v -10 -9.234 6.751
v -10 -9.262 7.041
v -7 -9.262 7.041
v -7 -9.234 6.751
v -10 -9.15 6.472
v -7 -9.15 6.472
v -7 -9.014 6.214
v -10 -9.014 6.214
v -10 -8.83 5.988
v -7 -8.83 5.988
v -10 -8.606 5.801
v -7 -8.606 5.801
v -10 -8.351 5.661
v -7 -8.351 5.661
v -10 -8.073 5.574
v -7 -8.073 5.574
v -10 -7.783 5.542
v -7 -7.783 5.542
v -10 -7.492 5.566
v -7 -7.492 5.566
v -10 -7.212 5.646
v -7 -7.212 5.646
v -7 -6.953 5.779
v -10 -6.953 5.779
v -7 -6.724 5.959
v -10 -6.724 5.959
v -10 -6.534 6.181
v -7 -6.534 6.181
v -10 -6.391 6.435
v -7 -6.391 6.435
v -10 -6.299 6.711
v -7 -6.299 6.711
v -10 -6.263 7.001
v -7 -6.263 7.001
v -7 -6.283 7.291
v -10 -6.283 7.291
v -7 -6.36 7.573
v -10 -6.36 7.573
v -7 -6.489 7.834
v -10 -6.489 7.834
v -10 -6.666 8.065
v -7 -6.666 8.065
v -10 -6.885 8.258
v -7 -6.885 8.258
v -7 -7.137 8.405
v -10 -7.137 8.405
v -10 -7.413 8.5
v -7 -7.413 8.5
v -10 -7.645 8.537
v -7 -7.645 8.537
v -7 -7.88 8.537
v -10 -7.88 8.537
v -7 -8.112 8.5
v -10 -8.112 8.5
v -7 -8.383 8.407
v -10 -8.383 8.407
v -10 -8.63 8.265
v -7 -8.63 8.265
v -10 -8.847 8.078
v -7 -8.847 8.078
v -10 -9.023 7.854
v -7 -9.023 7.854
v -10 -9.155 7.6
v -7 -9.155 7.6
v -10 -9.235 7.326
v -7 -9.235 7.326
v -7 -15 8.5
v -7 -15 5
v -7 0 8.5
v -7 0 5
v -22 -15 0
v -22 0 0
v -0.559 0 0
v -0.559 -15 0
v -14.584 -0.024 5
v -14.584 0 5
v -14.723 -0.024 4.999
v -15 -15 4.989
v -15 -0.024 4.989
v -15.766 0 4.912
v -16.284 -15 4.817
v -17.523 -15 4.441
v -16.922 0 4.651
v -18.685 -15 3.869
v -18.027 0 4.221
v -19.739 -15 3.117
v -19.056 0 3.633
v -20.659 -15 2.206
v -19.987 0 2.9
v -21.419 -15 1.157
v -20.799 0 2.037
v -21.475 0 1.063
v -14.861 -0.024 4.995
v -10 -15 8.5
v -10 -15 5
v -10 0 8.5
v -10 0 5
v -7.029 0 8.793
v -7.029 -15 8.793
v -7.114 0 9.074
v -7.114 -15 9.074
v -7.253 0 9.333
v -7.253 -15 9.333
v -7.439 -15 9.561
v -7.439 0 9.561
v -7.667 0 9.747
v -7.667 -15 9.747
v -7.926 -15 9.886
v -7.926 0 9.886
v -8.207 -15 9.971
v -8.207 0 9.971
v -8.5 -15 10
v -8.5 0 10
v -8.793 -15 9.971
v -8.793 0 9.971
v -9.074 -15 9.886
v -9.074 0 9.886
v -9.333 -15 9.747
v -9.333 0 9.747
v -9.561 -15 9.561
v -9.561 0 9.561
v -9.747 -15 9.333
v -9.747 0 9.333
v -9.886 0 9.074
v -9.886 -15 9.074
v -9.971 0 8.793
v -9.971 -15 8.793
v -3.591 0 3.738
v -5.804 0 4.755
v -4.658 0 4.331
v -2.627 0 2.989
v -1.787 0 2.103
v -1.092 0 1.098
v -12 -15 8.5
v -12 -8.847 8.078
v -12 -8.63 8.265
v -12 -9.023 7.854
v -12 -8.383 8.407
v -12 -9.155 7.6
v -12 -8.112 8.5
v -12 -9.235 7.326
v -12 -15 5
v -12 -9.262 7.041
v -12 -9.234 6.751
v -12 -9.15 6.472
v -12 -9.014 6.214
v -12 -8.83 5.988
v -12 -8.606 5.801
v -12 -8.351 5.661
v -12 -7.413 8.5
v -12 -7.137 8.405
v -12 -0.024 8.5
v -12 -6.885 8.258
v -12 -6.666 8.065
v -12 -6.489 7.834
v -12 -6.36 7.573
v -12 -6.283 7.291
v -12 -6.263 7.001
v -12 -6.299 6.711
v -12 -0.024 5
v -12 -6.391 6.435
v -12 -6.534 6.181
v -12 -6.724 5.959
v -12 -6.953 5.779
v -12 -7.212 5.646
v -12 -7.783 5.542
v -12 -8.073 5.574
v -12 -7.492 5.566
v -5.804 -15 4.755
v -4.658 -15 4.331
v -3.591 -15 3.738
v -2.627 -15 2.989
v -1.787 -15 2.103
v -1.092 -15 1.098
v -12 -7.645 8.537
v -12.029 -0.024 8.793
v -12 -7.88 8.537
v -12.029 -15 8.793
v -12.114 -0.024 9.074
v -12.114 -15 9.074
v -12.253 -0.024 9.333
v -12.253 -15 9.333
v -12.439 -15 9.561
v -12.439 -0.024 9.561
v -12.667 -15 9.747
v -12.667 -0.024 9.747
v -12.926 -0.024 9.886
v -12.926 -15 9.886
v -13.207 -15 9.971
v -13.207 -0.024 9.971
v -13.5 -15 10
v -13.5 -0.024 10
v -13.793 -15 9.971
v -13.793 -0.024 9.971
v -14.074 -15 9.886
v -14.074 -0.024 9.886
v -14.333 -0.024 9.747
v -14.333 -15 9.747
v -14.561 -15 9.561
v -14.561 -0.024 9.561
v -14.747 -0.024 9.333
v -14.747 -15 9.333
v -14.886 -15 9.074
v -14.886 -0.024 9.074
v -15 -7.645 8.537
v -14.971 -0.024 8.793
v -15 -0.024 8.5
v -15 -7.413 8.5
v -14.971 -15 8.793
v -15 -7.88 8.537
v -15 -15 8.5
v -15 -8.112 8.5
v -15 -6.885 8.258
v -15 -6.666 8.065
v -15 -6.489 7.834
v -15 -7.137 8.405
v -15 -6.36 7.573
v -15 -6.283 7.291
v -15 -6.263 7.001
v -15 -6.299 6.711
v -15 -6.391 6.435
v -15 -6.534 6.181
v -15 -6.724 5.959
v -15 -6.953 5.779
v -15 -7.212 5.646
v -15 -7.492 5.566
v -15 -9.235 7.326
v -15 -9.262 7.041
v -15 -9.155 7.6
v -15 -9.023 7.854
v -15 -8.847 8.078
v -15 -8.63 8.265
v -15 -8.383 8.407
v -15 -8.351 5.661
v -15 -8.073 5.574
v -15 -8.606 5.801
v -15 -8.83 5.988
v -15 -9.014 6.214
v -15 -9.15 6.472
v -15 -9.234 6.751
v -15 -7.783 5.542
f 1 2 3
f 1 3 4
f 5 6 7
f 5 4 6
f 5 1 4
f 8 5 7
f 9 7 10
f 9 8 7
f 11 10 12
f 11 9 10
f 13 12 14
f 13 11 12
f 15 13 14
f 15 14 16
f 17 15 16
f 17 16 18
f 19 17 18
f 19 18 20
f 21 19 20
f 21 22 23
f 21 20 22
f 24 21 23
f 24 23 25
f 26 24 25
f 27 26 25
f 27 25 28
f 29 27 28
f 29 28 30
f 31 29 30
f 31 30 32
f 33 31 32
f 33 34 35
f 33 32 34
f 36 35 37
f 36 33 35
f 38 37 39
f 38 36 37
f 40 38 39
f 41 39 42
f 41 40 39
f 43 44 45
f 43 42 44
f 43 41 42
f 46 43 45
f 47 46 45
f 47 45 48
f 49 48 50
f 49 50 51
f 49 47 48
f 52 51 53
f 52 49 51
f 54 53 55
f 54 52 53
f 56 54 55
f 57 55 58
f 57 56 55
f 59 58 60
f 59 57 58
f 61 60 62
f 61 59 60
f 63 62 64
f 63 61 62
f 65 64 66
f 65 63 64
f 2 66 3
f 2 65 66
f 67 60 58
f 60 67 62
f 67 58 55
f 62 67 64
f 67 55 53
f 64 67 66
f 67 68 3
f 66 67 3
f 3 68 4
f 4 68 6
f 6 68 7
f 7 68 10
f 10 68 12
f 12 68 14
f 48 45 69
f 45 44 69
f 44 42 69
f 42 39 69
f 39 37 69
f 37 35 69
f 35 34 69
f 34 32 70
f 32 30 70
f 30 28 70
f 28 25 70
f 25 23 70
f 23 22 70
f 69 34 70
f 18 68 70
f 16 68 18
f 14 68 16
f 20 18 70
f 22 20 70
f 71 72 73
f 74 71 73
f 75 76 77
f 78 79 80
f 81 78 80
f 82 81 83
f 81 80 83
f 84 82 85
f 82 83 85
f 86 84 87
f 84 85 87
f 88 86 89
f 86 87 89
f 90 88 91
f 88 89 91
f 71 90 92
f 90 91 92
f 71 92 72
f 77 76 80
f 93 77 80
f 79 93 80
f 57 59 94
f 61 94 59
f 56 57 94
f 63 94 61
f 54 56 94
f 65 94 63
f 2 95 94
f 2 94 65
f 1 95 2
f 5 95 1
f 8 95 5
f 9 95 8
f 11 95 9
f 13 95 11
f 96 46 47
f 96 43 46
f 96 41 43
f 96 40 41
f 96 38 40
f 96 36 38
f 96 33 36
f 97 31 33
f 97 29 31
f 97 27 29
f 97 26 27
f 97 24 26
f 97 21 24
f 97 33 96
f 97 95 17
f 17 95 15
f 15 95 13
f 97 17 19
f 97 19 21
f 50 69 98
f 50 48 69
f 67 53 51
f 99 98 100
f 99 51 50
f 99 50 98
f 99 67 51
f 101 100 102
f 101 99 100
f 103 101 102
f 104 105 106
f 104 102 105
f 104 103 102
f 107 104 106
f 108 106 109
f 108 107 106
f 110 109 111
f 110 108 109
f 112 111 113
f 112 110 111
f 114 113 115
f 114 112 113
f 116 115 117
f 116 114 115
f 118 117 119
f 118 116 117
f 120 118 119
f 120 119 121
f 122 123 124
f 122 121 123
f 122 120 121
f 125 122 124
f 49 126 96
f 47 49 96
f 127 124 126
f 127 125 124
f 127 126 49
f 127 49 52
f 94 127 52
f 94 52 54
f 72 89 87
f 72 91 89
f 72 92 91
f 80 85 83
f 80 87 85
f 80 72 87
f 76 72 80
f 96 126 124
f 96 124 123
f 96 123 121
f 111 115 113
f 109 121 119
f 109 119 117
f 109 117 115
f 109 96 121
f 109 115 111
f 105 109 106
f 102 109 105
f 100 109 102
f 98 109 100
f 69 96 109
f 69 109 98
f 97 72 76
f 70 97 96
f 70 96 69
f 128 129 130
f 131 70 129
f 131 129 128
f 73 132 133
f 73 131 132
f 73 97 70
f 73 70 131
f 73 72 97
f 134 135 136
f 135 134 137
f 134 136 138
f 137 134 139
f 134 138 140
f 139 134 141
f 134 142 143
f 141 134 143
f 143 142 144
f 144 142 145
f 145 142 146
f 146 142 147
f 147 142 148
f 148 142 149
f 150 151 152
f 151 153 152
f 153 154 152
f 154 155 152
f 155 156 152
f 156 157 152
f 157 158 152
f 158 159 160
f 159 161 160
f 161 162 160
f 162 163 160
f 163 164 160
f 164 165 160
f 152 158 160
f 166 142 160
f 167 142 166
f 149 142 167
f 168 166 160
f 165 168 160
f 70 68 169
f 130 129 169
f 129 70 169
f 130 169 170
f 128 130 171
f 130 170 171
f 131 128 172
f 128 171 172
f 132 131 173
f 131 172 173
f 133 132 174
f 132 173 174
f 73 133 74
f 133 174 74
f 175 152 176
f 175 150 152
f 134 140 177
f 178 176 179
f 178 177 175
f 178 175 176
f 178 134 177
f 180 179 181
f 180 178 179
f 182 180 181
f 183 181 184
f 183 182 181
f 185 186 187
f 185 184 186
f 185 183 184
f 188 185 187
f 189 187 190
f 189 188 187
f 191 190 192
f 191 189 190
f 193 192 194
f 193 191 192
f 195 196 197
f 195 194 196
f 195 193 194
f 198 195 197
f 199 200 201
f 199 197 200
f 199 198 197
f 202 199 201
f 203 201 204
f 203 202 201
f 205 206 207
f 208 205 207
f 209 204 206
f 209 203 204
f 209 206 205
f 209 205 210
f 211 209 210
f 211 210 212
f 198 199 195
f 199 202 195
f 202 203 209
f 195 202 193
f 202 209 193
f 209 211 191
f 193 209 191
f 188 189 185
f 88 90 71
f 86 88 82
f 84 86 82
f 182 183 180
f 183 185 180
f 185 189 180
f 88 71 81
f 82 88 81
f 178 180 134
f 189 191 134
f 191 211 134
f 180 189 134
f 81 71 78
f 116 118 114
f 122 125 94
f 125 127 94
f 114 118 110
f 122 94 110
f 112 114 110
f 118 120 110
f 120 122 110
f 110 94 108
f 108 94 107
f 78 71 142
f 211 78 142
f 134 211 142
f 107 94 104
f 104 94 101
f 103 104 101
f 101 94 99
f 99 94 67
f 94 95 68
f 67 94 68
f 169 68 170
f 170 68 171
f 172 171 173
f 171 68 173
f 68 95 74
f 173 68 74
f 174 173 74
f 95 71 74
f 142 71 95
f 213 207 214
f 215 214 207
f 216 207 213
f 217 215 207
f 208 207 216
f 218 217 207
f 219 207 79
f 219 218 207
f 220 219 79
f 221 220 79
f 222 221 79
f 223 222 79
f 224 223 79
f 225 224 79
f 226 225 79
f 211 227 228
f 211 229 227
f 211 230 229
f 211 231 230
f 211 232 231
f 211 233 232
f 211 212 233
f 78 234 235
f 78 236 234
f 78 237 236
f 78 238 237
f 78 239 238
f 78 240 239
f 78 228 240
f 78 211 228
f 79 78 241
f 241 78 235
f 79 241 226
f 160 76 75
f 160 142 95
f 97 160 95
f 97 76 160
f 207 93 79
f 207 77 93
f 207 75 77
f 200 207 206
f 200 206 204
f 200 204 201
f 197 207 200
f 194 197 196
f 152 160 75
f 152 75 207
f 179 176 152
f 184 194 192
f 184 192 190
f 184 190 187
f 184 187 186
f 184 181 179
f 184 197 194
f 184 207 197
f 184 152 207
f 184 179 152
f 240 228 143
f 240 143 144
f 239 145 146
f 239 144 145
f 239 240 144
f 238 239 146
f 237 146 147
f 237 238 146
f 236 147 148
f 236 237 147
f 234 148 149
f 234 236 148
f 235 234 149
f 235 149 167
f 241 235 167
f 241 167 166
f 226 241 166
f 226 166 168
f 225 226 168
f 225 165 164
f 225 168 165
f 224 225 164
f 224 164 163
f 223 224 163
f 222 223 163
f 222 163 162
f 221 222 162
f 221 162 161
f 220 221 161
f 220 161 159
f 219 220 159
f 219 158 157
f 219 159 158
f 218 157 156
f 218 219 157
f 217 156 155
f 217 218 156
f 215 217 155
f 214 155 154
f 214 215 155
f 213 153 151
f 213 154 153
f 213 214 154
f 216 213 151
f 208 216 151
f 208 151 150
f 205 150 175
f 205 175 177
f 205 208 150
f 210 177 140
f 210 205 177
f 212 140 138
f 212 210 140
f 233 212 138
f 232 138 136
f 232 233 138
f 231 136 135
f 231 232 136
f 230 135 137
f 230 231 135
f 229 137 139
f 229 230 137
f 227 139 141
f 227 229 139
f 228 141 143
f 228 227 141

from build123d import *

# Parameters (mm, degrees)
SKETCH1_W               = 22
SKETCH1_H               = 15
BOSS_EXTRUDE1_DEPTH     = 5
SKETCH2_W               = 3
SKETCH2_H               = 15
SKETCH2_H_2             = 14.97636143
BOSS_EXTRUDE2_DEPTH     = 5
CUT_EXTRUDE2_DEPTH      = 22.656407828
CUT_EXTRUDE2_DEPTH_BACK = 22.656407828
SKETCH4_R               = 1.5
FILLET1_R               = 8
FILLET3_RADIUS          = 1.5
FILLET3_LENGTH          = 14.97636143
FILLET4_RADIUS          = 1.5
FILLET4_LENGTH          = 15


with BuildPart() as part:
    # Sketch1 → Boss-Extrude1 (new body)
    with BuildSketch(Plane.XY):
        with Locations((-11, -7.5)):
            Rectangle(SKETCH1_W, SKETCH1_H)
    extrude(amount=BOSS_EXTRUDE1_DEPTH)

    # Sketch2 → Boss-Extrude2 (add)
    with BuildSketch(Plane.XY.offset(5)):
        with Locations((-8.5, -7.5)):
            Rectangle(SKETCH2_W, SKETCH2_H)
        with Locations((-13.5, -7.511819285)):
            Rectangle(SKETCH2_W, SKETCH2_H_2)
    extrude(amount=BOSS_EXTRUDE2_DEPTH)

    # Sketch4 → Cut-Extrude2 (cut, two sides: drawn at the far end of the back side and taken through both)
    with BuildSketch(Plane(origin=(-12, 0, 0), x_dir=(0, 0, -1), z_dir=(1, 0, 0)).offset(-CUT_EXTRUDE2_DEPTH_BACK)):
        with Locations(Location((-7.041389116, -7.762480296, 0), (0, 0, 270))):
            Circle(SKETCH4_R)
    extrude(amount=CUT_EXTRUDE2_DEPTH + CUT_EXTRUDE2_DEPTH_BACK, mode=Mode.SUBTRACT)

    # Fillet1
    # the kernel refuses this fillet: 8 mm, written as the material it takes off along each edge
    with BuildSketch(Plane(origin=(-22, 18.540496218, 5), x_dir=(1, 0, 0), z_dir=(0, -1, 0))) as fillet1_piece_1_section:
        with BuildLine():
            CenterArc((7.416198487, -8), FILLET1_R, 90, 67.975687163)
            Line((0, -5), (0, 0))
            Line((0, 0), (7.416198487, 0))
        make_face()
    fillet1_piece_1 = extrude(amount=52.080992435, mode=Mode.PRIVATE)
    fillet1_piece_1 = split(fillet1_piece_1, bisect_by=Plane(origin=(-22, -0.02363857, 5), z_dir=(0, 1, 0)), keep=Keep.TOP, mode=Mode.PRIVATE)
    add(fillet1_piece_1, mode=Mode.SUBTRACT)
    with BuildSketch(Plane(origin=(-22, 18.540496218, 5), x_dir=(1, 0, 0), z_dir=(0, -1, 0))) as fillet1_piece_2_section:
        with BuildLine():
            CenterArc((7.416198487, -8), FILLET1_R, 90, 67.975687163)
            Line((0, -5), (0, 0))
            Line((0, 0), (7.416198487, 0))
        make_face()
    fillet1_piece_2 = extrude(amount=52.080992435, mode=Mode.PRIVATE)
    fillet1_piece_2 = split(fillet1_piece_2, bisect_by=Plane(origin=(-15, 18.540496218, 5), z_dir=(-1, 0, 0)), keep=Keep.TOP, mode=Mode.PRIVATE)
    add(fillet1_piece_2, mode=Mode.SUBTRACT)
    with BuildSketch(Plane(origin=(0, -34.843134833, 5), x_dir=(0, 0, -1), z_dir=(0, 1, 0))) as fillet1_piece_3:
        with BuildLine():
            CenterArc((7.937253933, 8), FILLET1_R, 187.180755781, 82.819244219)
            Line((0, 7), (0, 0))
            Line((0, 0), (7.937253933, 0))
        make_face()
    extrude(amount=54.686269666, mode=Mode.SUBTRACT)

    # Fillet3: full round fillet: the end face becomes a half cylinder, R = half its width
    fillet3_face = Plane((-13.5, -7.511819285, 10), x_dir=(0, -1, 0), z_dir=(0, 0, 1))  # on the end face: x along it, z out of the body
    fillet3_slab = fillet3_face.offset(-FILLET3_RADIUS / 2) * Box(FILLET3_LENGTH, 2 * FILLET3_RADIUS, FILLET3_RADIUS, mode=Mode.PRIVATE)  # the body's end, R deep
    fillet3_round = Plane((-13.5, -7.511819285, 8.5), x_dir=(0, 0, 1), z_dir=(0, -1, 0)) * Cylinder(FILLET3_RADIUS, FILLET3_LENGTH, mode=Mode.PRIVATE)  # its axis R under the face
    add(fillet3_slab - fillet3_round, mode=Mode.SUBTRACT)

    # Fillet4: full round fillet: the end face becomes a half cylinder, R = half its width
    fillet4_face = Plane((-8.5, -7.5, 10), x_dir=(0, -1, 0), z_dir=(0, 0, 1))  # on the end face: x along it, z out of the body
    fillet4_slab = fillet4_face.offset(-FILLET4_RADIUS / 2) * Box(FILLET4_LENGTH, 2 * FILLET4_RADIUS, FILLET4_RADIUS, mode=Mode.PRIVATE)  # the body's end, R deep
    fillet4_round = Plane((-8.5, -7.5, 8.5), x_dir=(0, 0, 1), z_dir=(0, -1, 0)) * Cylinder(FILLET4_RADIUS, FILLET4_LENGTH, mode=Mode.PRIVATE)  # its axis R under the face
    add(fillet4_slab - fillet4_round, mode=Mode.SUBTRACT)


solid = part.part
